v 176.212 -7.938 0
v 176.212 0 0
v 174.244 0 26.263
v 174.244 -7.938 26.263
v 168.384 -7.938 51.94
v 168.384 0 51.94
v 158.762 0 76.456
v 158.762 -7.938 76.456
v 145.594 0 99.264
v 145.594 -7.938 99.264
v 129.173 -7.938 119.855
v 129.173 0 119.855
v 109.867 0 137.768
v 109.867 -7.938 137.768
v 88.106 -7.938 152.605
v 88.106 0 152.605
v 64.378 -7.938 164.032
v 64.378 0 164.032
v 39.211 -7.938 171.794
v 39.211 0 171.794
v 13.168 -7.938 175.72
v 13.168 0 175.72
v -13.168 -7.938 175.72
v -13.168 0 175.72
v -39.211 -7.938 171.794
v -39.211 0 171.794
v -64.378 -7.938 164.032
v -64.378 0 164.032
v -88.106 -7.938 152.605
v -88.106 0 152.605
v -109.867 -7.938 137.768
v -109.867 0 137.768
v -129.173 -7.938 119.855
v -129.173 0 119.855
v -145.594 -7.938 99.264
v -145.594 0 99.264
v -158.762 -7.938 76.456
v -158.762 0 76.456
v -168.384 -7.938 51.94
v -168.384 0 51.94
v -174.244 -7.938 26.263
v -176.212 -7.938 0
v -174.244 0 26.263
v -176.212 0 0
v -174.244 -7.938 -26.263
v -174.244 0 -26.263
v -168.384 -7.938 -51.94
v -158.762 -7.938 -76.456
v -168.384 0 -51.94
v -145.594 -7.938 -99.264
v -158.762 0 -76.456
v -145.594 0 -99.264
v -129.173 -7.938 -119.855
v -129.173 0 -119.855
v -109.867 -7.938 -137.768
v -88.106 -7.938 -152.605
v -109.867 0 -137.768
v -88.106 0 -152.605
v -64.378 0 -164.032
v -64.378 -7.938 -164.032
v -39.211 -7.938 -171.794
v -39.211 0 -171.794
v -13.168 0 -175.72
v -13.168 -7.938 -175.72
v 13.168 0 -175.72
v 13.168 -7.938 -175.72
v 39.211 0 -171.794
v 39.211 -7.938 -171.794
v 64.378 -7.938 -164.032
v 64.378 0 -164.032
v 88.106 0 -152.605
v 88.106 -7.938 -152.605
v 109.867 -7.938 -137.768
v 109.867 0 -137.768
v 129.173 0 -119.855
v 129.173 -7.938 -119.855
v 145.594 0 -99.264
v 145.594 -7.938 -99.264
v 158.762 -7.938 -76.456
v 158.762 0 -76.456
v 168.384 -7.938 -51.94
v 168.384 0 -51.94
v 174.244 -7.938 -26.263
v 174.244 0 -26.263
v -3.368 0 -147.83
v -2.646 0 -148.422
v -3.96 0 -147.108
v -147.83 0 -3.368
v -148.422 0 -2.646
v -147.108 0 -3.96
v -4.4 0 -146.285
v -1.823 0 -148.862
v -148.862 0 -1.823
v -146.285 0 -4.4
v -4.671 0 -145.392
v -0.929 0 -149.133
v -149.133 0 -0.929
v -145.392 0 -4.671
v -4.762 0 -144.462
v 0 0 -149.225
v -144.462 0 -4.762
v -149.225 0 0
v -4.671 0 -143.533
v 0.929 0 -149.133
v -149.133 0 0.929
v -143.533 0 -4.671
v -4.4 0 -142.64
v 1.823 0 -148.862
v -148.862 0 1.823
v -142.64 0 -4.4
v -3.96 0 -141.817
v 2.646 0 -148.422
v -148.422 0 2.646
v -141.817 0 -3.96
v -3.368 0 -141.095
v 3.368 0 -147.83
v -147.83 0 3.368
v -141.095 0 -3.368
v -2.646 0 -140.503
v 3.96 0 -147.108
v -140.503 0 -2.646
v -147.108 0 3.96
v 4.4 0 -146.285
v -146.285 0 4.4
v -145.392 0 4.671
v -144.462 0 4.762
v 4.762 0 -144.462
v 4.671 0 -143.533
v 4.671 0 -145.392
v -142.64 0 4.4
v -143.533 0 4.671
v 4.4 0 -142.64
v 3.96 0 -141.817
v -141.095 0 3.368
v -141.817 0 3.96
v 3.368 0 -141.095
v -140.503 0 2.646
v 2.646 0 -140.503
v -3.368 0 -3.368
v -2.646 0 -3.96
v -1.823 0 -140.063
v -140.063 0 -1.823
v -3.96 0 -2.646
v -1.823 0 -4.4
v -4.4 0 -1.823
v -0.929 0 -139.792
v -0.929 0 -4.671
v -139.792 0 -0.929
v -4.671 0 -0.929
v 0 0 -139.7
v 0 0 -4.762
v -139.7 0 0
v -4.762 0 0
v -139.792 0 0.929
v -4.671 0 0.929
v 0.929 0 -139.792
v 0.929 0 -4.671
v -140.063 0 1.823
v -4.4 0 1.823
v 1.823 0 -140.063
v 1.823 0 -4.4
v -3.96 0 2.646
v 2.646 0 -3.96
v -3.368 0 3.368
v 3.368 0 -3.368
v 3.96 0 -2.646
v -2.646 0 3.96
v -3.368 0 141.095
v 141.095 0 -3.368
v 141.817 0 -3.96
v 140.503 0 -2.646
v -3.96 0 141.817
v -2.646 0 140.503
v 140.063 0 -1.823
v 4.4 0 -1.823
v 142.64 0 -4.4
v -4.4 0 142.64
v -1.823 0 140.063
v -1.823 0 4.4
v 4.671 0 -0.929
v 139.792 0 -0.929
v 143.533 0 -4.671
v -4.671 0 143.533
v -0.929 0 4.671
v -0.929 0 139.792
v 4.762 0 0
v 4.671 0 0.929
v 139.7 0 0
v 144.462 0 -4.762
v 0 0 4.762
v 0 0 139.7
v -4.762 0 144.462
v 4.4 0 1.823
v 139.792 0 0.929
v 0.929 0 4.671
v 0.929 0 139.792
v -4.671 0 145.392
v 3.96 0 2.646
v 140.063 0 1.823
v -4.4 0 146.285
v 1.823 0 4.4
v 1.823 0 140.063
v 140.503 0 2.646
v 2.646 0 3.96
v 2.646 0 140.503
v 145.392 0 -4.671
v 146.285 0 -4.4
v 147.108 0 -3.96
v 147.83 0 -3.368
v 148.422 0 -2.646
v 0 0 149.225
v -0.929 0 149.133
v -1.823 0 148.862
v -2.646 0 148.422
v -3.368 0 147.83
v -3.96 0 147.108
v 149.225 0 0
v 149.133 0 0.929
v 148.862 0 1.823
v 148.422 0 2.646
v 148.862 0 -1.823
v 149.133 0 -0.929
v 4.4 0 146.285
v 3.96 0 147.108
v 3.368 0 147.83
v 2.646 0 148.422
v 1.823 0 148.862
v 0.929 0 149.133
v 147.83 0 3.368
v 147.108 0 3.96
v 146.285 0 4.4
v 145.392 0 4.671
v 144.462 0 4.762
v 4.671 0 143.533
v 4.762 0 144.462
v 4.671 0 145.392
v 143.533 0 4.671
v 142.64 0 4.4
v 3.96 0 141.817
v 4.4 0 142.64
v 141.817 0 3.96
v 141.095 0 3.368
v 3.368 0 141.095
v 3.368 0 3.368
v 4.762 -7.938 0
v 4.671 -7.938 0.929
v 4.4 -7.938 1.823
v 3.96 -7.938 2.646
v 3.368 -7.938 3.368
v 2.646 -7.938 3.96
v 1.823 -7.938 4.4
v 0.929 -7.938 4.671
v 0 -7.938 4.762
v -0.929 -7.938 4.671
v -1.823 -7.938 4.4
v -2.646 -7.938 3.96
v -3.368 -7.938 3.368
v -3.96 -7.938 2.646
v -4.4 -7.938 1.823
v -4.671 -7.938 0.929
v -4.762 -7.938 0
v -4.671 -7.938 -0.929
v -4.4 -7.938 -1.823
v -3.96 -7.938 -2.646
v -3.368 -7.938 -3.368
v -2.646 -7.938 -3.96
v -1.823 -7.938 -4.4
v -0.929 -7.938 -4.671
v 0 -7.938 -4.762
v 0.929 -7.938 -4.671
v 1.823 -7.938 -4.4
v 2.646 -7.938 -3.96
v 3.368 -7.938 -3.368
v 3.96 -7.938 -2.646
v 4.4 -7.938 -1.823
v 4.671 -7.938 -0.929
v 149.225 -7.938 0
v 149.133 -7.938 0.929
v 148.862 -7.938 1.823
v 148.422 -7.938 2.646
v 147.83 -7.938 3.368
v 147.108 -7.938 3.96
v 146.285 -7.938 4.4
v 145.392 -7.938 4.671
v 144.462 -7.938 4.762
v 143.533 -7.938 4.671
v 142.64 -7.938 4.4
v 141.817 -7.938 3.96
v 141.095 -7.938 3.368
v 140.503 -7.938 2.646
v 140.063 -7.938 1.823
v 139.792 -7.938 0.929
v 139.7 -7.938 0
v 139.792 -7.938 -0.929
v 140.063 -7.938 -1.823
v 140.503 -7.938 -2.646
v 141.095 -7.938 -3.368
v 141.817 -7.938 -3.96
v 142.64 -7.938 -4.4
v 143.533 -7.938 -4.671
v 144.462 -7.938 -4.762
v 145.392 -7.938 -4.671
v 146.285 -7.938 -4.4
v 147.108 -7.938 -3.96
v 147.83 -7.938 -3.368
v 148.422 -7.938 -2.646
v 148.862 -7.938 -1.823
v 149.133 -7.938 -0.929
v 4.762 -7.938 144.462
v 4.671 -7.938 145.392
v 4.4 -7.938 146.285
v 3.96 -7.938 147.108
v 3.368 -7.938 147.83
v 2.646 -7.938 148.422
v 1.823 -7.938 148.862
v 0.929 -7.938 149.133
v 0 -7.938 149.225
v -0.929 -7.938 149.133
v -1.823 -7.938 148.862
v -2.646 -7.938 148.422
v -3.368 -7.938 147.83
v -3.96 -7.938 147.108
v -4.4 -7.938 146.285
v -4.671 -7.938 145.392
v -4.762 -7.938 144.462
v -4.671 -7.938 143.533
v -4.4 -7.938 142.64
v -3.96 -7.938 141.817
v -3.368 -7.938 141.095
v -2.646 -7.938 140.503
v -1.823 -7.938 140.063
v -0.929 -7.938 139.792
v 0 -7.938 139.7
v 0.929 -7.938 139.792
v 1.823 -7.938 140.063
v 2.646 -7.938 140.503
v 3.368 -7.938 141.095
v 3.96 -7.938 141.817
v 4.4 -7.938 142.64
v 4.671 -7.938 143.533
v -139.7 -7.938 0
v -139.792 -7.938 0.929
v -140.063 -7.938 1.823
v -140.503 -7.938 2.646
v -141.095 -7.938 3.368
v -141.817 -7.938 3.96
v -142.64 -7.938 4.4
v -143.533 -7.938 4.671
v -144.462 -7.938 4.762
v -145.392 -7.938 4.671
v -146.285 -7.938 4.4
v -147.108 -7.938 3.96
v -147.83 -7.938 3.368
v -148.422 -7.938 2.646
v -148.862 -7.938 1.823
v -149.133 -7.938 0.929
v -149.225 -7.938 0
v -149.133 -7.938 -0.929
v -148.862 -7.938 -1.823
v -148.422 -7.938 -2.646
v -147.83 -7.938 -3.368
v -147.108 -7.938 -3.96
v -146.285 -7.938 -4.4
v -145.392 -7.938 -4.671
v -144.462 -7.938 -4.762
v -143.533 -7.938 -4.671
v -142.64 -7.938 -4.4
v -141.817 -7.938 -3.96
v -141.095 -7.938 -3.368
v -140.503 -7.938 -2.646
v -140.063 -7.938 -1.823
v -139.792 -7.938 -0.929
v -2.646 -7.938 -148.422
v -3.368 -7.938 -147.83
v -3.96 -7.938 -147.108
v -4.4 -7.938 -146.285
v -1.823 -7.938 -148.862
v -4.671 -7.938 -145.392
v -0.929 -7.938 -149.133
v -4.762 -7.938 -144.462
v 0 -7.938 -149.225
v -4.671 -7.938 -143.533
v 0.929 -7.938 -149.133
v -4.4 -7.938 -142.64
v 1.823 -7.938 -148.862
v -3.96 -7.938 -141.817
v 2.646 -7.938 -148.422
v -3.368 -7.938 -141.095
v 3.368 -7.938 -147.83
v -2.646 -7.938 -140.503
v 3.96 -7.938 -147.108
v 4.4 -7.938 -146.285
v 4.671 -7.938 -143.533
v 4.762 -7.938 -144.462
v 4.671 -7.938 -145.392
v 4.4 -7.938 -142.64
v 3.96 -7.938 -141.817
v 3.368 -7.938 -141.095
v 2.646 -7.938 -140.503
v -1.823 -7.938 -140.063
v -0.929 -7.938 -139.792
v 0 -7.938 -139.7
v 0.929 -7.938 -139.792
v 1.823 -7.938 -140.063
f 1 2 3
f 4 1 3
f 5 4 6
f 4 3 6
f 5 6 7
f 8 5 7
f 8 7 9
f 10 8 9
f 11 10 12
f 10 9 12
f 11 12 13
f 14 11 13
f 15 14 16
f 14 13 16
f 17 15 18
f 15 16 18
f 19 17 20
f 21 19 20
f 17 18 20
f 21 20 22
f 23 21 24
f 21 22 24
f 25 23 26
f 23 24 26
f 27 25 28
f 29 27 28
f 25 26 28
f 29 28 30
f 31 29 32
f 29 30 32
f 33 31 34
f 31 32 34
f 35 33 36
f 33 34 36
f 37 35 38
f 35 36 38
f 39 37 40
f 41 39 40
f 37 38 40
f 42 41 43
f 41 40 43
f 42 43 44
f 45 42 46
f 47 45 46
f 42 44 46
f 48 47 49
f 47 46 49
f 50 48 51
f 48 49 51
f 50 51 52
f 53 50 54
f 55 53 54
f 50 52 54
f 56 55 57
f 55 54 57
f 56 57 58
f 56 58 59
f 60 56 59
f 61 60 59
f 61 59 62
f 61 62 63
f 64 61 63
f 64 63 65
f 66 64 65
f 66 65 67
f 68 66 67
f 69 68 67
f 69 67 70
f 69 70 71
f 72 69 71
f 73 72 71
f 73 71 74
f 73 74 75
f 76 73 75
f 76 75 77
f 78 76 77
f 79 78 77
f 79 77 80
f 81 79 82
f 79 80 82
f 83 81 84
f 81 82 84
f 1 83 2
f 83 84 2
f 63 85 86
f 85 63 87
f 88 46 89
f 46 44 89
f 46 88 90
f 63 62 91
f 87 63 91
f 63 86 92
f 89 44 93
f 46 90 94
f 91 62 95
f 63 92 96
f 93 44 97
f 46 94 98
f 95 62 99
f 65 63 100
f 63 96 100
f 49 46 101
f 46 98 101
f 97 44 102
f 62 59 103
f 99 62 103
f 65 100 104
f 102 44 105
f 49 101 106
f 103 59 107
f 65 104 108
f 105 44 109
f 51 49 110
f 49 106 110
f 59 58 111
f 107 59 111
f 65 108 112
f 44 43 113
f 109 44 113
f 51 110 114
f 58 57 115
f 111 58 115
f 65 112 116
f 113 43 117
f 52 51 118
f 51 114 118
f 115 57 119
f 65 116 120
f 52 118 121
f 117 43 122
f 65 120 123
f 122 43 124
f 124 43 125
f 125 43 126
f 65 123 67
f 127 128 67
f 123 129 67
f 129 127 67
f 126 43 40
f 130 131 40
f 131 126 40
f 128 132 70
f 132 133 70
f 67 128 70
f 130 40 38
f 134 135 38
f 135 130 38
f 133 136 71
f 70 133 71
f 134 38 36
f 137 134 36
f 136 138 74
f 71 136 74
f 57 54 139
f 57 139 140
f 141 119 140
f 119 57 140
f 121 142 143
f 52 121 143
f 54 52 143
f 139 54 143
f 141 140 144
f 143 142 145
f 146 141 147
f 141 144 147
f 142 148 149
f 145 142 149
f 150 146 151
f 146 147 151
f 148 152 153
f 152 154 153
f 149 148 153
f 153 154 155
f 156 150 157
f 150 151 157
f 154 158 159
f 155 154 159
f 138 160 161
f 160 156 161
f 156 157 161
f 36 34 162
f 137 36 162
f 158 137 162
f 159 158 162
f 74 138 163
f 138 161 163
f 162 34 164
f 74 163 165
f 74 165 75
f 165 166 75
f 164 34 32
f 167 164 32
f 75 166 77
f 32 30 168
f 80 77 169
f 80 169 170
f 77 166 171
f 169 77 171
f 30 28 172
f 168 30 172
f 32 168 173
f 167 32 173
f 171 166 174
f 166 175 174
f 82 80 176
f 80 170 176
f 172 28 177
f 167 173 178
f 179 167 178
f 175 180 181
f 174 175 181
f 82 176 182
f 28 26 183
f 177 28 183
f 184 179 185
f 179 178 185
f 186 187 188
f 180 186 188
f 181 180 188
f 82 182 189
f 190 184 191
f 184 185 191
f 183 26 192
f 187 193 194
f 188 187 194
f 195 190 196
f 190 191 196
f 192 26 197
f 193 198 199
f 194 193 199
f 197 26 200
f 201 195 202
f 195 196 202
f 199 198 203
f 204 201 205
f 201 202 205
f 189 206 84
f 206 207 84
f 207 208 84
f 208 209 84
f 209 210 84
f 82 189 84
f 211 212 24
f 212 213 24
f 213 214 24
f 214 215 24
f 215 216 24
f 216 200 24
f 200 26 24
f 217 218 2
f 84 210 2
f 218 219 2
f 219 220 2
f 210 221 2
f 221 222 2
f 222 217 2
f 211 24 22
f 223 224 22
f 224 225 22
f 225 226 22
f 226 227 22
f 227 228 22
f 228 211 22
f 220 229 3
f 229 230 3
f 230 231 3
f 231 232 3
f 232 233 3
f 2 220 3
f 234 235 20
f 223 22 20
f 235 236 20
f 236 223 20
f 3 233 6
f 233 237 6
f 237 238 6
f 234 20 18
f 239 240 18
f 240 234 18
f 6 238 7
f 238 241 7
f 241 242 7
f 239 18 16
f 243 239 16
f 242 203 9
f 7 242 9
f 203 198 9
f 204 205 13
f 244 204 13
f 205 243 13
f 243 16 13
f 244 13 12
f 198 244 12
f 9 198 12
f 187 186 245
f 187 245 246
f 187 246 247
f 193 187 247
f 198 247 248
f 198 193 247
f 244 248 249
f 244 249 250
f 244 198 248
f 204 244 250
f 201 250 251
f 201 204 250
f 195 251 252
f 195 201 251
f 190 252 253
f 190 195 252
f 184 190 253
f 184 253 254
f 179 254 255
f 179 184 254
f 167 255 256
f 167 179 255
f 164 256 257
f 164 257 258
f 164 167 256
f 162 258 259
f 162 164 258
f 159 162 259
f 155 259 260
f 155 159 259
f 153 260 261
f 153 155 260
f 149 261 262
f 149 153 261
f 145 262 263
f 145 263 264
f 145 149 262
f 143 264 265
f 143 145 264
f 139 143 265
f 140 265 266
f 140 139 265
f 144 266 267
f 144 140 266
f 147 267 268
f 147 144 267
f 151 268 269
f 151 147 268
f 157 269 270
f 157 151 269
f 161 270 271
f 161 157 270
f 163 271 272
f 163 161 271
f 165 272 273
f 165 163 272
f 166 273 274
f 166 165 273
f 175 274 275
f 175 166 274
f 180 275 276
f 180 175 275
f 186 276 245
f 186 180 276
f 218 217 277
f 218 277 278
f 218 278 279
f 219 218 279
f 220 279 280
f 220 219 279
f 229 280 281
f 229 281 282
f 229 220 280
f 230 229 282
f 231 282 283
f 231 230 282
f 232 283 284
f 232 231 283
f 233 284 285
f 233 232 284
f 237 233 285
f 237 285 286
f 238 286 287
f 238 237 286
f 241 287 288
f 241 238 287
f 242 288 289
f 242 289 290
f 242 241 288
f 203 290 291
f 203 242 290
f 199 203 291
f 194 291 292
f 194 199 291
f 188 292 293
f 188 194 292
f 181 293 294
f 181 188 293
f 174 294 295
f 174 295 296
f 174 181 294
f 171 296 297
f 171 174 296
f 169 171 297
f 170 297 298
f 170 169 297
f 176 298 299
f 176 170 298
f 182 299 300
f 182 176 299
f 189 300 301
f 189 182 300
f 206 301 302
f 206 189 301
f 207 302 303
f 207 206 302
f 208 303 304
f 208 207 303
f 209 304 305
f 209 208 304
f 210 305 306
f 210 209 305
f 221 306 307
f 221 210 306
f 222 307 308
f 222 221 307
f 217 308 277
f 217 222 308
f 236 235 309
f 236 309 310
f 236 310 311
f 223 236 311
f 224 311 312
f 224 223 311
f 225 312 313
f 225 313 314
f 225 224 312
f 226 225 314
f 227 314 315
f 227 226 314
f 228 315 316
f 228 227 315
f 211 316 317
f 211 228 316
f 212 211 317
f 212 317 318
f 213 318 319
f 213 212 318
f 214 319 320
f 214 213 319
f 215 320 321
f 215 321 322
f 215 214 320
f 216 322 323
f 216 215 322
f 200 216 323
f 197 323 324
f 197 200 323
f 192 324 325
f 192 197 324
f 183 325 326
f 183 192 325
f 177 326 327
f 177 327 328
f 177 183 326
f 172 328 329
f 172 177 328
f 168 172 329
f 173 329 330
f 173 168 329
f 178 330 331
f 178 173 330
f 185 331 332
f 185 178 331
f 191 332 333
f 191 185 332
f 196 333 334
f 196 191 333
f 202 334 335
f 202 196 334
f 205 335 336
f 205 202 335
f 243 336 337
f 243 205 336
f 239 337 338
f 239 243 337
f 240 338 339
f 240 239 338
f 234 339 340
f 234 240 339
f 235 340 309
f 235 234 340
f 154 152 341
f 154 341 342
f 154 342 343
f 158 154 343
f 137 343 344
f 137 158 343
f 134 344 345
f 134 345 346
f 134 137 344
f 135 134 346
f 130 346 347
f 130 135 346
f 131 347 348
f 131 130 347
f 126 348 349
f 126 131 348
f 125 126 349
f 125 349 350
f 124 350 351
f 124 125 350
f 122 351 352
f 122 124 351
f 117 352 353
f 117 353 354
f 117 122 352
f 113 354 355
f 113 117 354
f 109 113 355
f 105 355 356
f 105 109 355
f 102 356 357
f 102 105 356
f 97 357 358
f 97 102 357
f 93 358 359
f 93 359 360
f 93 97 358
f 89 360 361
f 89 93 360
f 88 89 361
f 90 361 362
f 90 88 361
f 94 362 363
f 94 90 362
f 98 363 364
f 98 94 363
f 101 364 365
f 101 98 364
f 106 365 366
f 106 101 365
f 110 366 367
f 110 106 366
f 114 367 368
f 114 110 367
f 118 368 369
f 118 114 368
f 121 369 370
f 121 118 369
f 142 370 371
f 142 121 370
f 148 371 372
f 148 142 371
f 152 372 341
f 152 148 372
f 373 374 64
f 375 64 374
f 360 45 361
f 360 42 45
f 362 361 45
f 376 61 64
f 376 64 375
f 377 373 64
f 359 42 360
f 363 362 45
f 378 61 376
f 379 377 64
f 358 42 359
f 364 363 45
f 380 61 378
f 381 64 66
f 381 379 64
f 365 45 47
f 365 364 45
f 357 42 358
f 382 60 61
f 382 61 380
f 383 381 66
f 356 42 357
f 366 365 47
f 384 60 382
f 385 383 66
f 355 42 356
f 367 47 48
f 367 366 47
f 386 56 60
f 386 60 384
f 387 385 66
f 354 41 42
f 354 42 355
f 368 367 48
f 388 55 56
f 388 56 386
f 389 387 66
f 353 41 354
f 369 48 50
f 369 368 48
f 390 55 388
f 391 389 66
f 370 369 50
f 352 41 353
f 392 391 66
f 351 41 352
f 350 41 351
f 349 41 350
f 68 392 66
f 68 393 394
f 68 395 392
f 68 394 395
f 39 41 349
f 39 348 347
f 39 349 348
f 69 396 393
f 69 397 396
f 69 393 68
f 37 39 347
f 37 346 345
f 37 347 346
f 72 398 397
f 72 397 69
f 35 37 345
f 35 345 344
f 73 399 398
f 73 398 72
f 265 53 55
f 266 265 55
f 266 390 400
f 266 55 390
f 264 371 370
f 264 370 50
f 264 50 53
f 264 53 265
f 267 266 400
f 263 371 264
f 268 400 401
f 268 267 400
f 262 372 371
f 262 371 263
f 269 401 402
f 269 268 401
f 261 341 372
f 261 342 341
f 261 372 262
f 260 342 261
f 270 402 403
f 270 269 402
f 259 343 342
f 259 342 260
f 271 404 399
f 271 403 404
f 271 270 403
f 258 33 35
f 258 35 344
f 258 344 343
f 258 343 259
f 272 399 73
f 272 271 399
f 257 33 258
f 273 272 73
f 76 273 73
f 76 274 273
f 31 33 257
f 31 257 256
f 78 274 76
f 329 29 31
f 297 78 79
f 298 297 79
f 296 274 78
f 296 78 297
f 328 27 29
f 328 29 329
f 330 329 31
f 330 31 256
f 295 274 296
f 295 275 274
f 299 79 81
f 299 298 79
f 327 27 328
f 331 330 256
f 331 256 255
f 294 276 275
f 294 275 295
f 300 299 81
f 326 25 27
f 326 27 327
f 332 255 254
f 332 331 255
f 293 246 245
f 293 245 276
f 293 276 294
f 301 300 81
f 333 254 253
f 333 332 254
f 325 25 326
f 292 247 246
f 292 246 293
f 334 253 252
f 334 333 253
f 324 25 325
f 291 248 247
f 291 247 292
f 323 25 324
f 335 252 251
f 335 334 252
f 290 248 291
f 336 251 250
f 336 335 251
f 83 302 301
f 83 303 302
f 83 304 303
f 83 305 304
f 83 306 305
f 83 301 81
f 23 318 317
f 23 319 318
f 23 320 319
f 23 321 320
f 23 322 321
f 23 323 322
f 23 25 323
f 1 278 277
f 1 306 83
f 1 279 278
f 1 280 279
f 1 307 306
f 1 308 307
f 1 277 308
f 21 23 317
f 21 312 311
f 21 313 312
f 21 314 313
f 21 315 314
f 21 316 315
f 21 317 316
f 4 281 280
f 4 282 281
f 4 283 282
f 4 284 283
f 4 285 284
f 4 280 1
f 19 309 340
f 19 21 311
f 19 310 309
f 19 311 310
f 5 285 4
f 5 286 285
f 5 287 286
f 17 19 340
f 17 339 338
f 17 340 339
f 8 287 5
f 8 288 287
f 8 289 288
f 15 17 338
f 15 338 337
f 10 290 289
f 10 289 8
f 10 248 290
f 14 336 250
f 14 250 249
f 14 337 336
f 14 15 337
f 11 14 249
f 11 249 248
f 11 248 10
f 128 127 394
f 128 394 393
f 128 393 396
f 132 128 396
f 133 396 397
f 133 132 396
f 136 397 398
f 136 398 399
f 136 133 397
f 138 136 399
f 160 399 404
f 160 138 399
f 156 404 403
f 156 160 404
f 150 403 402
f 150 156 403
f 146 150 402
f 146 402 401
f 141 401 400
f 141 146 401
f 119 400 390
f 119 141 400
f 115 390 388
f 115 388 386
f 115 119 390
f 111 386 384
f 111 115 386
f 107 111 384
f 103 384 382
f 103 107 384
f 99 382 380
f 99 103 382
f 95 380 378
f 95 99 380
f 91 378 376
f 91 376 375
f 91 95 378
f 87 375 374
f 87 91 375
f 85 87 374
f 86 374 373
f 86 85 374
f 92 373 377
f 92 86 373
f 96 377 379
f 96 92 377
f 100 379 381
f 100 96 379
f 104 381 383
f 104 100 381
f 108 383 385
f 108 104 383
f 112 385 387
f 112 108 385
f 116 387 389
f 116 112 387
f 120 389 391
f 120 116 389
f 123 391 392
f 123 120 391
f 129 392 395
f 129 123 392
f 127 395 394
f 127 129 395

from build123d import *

# Parameters (mm, degrees)
F0_R     = 176.2125
F0_R_2   = 4.7625
F1_DEPTH = 7.9375


with BuildPart() as f1:
    # F0 (on Front) → F1 (new body)
    with BuildSketch(Plane.XZ):
        Circle(F0_R)
        with Locations((0, -144.4625)):
            Circle(F0_R_2, mode=Mode.SUBTRACT)
        with Locations((-144.4625, 0)):
            Circle(F0_R_2, mode=Mode.SUBTRACT)
        Circle(F0_R_2, mode=Mode.SUBTRACT)
        with Locations((144.4625, 0)):
            Circle(F0_R_2, mode=Mode.SUBTRACT)
        with Locations((0, 144.4625)):
            Circle(F0_R_2, mode=Mode.SUBTRACT)
    extrude(amount=F1_DEPTH)


solid = f1.part
